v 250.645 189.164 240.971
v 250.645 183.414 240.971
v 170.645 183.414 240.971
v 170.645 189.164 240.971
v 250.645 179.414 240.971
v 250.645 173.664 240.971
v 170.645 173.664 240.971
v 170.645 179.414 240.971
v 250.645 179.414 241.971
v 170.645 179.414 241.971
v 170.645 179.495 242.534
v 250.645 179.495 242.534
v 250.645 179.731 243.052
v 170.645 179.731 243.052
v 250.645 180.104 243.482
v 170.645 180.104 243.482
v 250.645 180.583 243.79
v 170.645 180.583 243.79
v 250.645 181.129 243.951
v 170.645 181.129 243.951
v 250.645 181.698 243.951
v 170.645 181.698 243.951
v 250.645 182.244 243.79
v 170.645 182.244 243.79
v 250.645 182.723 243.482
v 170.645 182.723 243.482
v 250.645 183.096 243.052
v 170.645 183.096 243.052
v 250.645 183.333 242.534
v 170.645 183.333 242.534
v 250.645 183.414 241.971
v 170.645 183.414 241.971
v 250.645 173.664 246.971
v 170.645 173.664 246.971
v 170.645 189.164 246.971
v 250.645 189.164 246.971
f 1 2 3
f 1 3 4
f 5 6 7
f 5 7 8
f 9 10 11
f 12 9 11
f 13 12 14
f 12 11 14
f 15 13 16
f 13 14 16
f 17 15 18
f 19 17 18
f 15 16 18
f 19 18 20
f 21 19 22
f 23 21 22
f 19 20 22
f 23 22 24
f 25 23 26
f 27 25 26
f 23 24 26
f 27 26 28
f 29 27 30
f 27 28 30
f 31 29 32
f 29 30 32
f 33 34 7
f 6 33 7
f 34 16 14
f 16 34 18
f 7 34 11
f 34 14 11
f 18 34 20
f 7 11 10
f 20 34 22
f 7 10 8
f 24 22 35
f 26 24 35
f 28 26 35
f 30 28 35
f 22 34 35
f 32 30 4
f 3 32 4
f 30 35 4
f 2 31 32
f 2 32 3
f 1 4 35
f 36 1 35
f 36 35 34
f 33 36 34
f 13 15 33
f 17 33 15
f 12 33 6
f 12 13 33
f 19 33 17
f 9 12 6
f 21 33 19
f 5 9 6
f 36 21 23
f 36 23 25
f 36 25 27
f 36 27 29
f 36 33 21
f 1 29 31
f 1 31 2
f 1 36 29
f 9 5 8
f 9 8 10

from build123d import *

# Parameters (mm, degrees)
BOSS_EXTRUDE1_DEPTH      = 60
BOSS_EXTRUDE1_DEPTH_BACK = 20


with BuildPart() as part:
    # Sketch1 → Boss-Extrude1 (new, two sides: drawn at the far end of the back side and taken through both)
    with BuildSketch(Plane(origin=(190.645148, 0, 0), x_dir=(0, 0, -1), z_dir=(1, 0, 0)).offset(-BOSS_EXTRUDE1_DEPTH_BACK)):
        with BuildLine():
            Line((-240.970904961, 189.163538159), (-246.970904961, 189.163538159))
            Line((-246.970904961, 189.163538159), (-246.970904961, 173.663538158))
            Line((-246.970904961, 173.663538158), (-240.970904961, 173.663538158))
            Line((-240.970904961, 173.663538158), (-240.970904961, 179.413538158))
            Line((-240.970904961, 179.413538158), (-241.970904961, 179.413538158))
            ThreePointArc((-241.970904961, 179.413538158), (-243.970904961, 181.413538158), (-241.970904961, 183.413538158))
            Line((-241.970904961, 183.413538158), (-240.970904961, 183.413538158))
            Line((-240.970904961, 183.413538158), (-240.970904961, 189.163538159))
        make_face()
    extrude(amount=BOSS_EXTRUDE1_DEPTH + BOSS_EXTRUDE1_DEPTH_BACK)


solid = part.part
